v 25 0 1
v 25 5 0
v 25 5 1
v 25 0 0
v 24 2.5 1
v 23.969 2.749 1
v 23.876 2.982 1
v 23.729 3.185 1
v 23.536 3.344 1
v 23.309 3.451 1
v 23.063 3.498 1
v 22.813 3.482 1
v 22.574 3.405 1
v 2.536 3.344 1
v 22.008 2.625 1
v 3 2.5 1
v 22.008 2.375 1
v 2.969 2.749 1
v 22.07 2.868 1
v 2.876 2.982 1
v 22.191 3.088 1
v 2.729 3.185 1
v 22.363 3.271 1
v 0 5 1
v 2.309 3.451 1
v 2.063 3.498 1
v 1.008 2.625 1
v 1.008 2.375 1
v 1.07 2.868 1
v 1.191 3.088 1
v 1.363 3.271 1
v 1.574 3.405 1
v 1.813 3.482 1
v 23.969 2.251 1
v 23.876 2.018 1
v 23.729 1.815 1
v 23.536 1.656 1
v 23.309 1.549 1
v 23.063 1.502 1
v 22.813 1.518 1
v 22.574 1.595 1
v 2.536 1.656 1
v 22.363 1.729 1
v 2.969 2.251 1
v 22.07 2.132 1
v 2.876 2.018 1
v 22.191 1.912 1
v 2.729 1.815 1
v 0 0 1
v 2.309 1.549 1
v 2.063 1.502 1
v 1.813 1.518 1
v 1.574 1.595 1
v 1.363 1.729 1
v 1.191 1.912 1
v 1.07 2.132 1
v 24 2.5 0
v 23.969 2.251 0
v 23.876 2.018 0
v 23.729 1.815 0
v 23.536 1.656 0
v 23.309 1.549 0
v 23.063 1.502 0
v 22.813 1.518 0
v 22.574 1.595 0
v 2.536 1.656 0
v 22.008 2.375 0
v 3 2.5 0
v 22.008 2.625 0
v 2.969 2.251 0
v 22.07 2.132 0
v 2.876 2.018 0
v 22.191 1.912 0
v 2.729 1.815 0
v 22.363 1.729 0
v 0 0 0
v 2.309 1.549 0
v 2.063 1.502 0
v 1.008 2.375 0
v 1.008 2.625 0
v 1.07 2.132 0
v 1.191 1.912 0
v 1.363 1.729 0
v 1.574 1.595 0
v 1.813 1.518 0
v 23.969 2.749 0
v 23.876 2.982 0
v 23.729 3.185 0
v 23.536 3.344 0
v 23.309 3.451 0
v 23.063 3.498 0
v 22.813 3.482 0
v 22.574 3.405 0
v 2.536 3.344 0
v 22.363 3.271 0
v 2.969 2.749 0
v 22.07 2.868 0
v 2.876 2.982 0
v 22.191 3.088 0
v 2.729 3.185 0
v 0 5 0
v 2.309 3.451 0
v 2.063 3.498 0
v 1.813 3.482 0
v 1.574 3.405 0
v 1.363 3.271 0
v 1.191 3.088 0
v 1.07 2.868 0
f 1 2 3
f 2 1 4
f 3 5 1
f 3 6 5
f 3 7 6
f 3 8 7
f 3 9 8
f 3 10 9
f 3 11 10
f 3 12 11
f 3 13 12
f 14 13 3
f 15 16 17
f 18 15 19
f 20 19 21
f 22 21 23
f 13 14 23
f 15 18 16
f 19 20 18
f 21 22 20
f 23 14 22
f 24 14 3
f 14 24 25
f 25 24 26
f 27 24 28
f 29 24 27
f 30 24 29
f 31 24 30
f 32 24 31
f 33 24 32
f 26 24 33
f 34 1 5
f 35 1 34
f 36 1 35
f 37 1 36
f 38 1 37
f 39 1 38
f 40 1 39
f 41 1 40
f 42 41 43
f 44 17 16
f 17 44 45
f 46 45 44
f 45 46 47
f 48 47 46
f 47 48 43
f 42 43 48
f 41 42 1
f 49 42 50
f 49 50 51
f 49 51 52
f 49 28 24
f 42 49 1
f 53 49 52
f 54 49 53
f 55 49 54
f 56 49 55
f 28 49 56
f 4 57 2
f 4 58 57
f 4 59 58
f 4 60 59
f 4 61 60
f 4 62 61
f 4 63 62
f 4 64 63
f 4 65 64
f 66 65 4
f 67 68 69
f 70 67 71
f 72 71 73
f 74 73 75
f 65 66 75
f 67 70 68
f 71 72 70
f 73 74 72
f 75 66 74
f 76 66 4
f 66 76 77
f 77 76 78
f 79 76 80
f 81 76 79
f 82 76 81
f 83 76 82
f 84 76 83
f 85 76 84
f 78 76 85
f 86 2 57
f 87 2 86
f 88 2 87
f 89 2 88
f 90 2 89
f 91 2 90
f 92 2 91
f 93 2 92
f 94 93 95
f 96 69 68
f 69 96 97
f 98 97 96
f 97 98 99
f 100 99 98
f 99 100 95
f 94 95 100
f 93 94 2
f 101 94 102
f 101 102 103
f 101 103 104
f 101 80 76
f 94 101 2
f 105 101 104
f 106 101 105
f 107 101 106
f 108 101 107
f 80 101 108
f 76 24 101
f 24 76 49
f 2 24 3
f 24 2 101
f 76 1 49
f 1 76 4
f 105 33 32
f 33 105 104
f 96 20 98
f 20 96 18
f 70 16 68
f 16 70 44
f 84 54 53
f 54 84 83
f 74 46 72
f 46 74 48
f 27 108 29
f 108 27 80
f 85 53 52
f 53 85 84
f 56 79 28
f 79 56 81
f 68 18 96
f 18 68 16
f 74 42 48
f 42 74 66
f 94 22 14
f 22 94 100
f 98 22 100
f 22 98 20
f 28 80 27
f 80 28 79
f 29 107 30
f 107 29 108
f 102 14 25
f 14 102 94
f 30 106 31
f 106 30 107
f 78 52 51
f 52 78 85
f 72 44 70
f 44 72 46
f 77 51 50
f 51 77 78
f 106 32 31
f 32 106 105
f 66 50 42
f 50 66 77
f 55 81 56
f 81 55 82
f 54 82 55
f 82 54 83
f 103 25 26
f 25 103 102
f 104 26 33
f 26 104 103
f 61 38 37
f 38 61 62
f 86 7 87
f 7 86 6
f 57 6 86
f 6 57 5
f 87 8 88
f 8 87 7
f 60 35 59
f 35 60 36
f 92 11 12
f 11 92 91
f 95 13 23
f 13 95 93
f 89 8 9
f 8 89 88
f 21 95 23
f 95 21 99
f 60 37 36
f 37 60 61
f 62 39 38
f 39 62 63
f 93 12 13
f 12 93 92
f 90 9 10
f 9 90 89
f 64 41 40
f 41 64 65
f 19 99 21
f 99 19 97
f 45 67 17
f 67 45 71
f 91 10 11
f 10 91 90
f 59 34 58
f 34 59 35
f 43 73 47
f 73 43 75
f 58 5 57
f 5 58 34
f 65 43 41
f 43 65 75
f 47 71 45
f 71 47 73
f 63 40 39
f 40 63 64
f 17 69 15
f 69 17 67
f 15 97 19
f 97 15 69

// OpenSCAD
//scale of the full design
SCALE = 1;

//resolution of the hole cutouts
RESOLUTION = 25;

//connector length
LENGTH = 25 * SCALE;

//connector width
WIDTH = 5 * SCALE;

//connector thickness
THICK = 1 * SCALE;

//hole radius
RADIUS = 1 * SCALE;

//hole offset from edge
OFFSET = 1 * SCALE;

difference(){
  //CONNECTOR SHAPE
  cube([
    //LENGTH (x-axis)
    LENGTH, 
    
    //WIDTH (y-axis)
    WIDTH,
  
    //HEIGHT (z-axis)
    THICK]);
  
  //HOLE 1
  translate([
    //X TRANSLATION
    RADIUS + OFFSET, //offset from edge
  
    //Y TRANSLATION
    WIDTH / 2, //middle of connector width
  
    //Z TRANSLATION
    -THICK / 2]) //move down so hole is cut from top to bottom
  
  #cylinder(
    //RESOLUTION
    $fn = RESOLUTION,
    
    //HEIGHT
    THICK * 2, //double the connector thickness
    
    //BOTTOM RADIUS
    RADIUS,
    
    //TOP RADIUS
    RADIUS);
  
  //HOLE 2
  translate([
    //X TRANSLATION
    LENGTH - RADIUS - OFFSET, //offset from edge
  
    //Y TRANSLATION
    WIDTH / 2, //middle of connector width
  
    //Z TRANSLATION
    -THICK / 2]) //move down so hole is cut from top to bottom
  
  #cylinder(
    //RESOLUTION
    $fn = RESOLUTION,
    
    //HEIGHT
    THICK * 2, //double the connector thickness
    
    //BOTTOM RADIUS
    RADIUS,
    
    //TOP RADIUS
    RADIUS);
}
